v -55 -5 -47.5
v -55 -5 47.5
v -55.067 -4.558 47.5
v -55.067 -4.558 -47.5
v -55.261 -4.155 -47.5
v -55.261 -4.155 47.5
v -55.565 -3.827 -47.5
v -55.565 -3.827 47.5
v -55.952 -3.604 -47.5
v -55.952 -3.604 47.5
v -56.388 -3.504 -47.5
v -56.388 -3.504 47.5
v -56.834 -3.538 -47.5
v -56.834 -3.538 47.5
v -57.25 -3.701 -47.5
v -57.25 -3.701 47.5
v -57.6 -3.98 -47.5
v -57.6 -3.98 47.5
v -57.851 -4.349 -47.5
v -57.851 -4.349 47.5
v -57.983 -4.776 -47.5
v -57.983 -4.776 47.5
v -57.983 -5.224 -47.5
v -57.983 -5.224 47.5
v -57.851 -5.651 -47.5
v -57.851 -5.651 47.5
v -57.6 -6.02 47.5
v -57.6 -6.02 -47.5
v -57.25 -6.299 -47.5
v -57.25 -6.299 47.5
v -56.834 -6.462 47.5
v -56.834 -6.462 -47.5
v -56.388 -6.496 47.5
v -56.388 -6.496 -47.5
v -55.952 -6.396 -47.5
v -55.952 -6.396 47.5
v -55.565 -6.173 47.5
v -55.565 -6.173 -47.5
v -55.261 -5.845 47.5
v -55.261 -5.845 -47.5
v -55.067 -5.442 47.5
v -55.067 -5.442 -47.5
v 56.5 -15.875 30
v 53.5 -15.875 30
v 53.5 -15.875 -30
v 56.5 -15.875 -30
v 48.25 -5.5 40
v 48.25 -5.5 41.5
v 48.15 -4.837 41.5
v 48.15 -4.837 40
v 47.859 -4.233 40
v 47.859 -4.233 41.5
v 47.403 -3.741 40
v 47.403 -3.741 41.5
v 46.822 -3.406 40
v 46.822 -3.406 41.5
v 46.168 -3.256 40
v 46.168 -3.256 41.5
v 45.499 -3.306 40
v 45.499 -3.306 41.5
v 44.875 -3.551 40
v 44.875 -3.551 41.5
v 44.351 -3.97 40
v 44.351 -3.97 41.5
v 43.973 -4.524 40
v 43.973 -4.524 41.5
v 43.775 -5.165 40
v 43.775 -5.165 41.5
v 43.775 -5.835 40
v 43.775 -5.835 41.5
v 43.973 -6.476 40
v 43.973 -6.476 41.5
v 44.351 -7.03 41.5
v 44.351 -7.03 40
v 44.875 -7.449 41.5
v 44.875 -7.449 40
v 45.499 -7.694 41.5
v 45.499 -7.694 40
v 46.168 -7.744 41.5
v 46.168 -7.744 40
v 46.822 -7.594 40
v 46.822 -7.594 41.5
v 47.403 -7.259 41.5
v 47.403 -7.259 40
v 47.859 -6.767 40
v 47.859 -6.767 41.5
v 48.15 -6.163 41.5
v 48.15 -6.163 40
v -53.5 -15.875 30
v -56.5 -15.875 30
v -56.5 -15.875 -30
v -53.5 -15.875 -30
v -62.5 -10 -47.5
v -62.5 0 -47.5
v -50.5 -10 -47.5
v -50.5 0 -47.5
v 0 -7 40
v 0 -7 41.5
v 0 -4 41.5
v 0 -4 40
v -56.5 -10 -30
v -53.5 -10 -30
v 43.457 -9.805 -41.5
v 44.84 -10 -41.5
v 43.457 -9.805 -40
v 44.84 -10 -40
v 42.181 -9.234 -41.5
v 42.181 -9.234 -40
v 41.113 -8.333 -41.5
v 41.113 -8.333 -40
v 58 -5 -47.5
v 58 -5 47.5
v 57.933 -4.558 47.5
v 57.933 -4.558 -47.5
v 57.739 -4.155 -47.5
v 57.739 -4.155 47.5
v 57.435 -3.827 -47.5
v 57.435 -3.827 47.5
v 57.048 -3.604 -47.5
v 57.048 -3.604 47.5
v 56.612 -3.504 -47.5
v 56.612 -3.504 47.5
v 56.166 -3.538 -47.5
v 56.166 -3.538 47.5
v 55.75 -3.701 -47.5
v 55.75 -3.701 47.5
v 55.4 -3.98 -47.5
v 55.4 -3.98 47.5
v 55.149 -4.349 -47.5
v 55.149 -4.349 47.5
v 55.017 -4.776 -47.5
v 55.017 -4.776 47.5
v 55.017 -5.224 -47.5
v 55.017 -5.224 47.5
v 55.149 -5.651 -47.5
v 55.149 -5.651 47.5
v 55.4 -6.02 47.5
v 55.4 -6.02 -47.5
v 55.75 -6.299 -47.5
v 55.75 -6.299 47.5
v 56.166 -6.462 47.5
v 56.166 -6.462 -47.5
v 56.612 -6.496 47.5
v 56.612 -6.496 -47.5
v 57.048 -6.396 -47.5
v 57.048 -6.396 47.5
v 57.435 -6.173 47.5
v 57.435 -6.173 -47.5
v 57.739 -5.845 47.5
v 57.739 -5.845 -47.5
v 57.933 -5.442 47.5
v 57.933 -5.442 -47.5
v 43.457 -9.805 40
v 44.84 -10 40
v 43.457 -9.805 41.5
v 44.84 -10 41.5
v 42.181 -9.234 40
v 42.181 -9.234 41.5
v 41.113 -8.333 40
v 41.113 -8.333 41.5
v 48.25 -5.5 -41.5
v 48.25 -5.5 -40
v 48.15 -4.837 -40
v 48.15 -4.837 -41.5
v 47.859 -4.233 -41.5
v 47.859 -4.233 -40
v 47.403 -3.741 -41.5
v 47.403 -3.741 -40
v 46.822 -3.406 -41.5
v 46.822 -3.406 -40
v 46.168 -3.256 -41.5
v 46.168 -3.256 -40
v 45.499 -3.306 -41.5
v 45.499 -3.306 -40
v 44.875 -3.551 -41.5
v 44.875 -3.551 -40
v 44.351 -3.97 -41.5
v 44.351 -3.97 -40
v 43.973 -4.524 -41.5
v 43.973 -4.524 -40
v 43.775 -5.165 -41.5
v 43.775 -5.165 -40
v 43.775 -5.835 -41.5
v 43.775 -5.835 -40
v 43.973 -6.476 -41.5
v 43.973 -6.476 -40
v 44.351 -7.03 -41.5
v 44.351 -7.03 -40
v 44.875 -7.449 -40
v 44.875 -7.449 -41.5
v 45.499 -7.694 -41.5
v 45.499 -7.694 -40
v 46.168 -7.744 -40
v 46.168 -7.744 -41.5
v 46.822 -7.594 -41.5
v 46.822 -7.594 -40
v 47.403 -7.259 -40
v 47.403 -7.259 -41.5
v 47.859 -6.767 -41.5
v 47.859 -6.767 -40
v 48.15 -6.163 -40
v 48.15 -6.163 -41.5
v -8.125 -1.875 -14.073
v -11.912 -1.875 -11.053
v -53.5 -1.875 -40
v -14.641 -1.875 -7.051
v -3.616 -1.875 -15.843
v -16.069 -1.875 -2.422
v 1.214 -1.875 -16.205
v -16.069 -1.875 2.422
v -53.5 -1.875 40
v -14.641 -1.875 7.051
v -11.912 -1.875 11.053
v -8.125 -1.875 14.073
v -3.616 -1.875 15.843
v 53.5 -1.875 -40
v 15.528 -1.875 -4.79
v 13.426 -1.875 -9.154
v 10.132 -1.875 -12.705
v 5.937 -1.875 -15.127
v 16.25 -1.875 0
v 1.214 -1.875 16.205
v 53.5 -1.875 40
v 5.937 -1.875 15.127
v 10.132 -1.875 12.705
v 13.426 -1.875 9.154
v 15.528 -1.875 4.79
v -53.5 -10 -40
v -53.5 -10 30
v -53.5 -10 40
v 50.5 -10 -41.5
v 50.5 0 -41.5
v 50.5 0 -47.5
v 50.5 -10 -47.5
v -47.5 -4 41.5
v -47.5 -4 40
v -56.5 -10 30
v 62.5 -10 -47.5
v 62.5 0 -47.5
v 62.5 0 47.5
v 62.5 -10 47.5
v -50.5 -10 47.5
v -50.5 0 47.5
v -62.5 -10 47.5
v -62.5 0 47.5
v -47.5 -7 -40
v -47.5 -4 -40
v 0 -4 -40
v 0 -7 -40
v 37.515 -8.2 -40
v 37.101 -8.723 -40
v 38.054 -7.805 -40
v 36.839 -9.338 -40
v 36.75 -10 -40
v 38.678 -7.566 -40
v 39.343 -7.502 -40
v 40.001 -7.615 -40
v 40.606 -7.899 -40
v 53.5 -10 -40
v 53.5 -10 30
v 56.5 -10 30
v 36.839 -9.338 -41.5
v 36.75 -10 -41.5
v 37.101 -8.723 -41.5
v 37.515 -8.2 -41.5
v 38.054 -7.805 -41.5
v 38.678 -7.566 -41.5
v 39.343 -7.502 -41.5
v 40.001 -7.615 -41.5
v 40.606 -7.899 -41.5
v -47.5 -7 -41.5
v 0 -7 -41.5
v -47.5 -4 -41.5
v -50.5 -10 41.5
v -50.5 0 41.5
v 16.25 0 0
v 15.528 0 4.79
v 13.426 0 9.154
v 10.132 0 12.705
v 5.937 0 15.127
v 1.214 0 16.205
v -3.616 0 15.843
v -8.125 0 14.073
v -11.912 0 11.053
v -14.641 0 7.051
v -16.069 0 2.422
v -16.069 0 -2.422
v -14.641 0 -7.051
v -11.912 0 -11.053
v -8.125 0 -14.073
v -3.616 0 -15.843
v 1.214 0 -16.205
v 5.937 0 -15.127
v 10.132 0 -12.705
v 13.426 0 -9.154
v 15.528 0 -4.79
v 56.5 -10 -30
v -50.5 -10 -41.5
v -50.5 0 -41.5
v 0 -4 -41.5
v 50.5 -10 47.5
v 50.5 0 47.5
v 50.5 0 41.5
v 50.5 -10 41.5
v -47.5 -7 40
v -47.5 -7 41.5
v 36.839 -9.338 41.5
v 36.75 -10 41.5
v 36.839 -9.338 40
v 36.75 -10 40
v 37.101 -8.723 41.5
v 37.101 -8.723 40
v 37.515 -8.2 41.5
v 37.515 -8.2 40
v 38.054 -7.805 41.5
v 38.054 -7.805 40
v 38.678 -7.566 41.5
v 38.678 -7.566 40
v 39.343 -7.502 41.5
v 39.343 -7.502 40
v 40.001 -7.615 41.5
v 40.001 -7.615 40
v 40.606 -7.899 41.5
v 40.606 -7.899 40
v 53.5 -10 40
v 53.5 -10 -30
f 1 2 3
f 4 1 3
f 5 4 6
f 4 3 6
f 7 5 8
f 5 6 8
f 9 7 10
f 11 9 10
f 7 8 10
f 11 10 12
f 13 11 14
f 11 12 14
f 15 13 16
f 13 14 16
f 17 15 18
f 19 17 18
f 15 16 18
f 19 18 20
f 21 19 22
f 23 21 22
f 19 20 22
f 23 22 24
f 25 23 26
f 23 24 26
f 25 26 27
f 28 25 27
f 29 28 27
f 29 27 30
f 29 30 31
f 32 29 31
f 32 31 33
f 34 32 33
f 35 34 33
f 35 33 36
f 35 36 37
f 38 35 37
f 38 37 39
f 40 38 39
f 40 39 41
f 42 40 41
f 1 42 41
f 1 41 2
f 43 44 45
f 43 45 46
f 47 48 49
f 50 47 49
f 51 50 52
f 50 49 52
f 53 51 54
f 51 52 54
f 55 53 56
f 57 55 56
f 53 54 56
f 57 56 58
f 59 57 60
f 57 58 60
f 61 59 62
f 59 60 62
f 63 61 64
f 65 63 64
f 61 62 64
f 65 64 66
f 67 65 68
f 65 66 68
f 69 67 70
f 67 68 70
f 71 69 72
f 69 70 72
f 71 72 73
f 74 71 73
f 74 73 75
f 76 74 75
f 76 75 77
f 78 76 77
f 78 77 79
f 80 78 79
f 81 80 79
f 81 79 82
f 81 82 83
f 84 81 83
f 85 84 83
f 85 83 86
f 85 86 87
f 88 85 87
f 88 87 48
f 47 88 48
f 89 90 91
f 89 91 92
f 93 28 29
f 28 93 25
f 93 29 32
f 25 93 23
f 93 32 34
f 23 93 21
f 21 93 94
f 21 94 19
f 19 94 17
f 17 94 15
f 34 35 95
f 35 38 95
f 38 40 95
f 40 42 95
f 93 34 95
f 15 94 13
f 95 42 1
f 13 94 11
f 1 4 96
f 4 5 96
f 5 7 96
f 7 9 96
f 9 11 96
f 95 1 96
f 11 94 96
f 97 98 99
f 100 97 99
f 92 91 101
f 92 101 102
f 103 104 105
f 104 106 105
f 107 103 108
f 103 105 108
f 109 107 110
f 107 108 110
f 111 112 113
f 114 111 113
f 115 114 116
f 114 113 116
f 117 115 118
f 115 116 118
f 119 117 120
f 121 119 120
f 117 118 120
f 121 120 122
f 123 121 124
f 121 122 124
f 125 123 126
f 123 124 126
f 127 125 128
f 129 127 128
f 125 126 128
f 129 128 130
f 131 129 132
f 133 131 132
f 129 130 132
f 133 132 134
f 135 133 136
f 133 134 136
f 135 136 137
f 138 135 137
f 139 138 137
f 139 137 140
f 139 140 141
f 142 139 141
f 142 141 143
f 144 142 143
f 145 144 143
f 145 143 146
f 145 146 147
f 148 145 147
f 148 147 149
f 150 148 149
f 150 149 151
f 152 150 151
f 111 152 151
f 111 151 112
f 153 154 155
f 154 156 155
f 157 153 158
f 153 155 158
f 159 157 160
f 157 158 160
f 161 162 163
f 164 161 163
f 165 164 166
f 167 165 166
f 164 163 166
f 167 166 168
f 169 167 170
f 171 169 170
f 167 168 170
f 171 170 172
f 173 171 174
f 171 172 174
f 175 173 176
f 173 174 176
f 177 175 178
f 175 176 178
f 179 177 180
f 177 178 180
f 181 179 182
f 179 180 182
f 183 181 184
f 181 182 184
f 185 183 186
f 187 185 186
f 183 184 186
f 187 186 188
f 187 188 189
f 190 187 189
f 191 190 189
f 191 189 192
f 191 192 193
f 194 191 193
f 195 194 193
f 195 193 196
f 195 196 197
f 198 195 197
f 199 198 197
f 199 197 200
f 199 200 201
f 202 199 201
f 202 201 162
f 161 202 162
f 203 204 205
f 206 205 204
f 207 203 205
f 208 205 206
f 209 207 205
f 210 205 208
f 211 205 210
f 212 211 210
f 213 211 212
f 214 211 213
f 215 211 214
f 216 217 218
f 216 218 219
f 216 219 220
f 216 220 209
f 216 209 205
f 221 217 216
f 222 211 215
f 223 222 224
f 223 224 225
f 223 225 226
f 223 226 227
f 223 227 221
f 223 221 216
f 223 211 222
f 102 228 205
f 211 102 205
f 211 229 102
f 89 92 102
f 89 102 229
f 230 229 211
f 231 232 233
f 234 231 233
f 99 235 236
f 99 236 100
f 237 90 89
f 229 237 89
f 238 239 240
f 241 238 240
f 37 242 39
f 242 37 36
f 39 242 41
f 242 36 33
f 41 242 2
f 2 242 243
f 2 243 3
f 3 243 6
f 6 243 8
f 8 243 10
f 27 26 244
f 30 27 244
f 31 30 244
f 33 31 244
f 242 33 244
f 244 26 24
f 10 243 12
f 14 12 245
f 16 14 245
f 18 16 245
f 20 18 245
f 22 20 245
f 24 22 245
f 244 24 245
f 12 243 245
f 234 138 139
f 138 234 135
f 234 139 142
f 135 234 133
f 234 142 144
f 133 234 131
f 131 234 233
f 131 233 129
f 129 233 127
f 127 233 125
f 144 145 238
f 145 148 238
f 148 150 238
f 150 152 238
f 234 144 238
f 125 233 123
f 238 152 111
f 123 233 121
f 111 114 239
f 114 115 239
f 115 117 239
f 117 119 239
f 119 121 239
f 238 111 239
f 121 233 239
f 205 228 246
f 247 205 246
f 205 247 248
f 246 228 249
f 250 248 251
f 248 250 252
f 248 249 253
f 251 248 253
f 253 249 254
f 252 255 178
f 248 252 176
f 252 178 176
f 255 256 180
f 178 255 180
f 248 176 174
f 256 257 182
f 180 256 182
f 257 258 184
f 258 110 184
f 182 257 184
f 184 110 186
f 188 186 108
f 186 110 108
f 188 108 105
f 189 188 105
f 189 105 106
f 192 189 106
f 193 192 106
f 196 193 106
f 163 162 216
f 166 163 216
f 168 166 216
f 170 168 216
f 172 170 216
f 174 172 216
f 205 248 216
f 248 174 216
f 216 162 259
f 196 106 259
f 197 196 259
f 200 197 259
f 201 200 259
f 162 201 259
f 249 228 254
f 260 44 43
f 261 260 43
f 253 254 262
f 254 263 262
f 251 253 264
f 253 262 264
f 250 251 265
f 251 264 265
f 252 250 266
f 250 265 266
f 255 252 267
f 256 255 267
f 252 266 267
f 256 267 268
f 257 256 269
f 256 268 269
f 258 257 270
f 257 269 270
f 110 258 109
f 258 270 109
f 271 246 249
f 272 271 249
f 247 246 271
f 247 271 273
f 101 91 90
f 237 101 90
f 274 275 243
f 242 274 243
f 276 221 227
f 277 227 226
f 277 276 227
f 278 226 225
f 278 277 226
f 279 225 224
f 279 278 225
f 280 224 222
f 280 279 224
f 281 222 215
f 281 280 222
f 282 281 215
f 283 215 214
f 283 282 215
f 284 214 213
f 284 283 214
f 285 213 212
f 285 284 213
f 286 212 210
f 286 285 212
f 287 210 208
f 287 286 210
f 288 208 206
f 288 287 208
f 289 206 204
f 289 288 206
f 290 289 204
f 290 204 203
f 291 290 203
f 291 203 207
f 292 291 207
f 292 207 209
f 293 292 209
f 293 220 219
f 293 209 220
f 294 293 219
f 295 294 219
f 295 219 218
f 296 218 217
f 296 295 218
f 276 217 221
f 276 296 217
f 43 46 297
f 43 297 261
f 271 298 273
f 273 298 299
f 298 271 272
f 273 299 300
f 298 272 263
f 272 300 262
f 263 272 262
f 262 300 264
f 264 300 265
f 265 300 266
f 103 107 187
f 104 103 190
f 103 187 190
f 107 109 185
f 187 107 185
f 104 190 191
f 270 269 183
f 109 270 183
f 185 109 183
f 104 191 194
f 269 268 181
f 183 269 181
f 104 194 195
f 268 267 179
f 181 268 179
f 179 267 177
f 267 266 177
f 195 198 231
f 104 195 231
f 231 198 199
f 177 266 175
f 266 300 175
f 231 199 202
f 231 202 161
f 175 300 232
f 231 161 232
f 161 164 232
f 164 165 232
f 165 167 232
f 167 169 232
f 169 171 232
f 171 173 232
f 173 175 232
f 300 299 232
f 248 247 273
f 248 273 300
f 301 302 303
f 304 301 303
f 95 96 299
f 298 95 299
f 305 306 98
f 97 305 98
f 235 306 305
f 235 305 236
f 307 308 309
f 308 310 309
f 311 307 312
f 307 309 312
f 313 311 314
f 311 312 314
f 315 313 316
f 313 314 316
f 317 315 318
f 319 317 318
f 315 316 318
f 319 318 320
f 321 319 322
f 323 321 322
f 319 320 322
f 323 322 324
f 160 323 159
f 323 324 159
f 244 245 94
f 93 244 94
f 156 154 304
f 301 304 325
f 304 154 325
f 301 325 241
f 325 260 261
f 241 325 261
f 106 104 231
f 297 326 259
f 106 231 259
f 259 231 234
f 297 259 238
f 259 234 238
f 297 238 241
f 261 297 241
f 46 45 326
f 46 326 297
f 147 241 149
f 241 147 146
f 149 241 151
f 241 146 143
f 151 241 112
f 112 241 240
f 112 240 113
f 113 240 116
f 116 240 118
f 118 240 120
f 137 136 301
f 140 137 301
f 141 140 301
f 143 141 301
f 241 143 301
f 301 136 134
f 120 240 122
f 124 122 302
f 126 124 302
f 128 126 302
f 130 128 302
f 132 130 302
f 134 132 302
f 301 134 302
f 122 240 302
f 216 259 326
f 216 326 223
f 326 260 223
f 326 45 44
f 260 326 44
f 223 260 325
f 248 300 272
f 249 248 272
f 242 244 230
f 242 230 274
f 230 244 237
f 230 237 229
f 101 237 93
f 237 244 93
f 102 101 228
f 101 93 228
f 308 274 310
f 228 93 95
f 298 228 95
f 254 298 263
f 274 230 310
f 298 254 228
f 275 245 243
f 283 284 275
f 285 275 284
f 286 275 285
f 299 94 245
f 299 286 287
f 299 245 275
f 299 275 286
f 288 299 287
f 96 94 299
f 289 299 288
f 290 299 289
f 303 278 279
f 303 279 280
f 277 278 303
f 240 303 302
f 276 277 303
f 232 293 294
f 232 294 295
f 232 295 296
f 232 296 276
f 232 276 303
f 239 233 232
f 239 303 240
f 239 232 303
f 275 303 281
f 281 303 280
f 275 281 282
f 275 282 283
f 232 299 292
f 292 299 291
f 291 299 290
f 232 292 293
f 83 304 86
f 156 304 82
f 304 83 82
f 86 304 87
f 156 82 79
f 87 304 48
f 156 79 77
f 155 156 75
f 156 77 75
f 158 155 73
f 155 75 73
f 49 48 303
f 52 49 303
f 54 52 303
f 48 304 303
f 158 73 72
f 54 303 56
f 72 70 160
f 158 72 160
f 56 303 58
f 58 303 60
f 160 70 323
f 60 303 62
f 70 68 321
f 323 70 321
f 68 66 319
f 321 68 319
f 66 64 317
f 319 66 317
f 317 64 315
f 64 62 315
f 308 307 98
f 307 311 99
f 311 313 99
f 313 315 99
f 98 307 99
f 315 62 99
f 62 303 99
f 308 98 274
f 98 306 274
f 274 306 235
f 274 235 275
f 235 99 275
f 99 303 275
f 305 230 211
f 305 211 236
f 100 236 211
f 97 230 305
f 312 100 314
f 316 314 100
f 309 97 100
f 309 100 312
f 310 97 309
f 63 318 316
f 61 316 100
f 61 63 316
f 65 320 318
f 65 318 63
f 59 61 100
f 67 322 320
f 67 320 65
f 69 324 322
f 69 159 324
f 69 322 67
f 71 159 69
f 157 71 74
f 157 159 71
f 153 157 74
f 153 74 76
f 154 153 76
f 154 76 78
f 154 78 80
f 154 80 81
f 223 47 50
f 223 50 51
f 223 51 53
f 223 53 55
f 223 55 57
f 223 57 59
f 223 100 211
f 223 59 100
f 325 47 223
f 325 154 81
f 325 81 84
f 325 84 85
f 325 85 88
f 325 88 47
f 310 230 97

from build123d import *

# Parameters (mm, degrees)
F0_R      = 16.25
F1_DEPTH  = 15.875
F2_W      = 139.2096877098
F2_H      = 115.5483946204
F2_W_2    = 113
F2_H_2    = 80
F3_DEPTH  = 5.875
F4_W      = 107
F4_H      = 80
F5_DEPTH  = 14
F6_W      = 120.5911301091
F6_H      = 13.1527084535
F6_W_2    = 121.3300417974
F6_H_2    = 15.8128053223
F7_DEPTH  = 5.875
F8_R      = 1.5
F8_W      = 89
F8_H      = 3
F9_DEPTH  = 100
F10_W     = 42.4407012761
F10_H     = 10
F11_DEPTH = 1.5
F12_W     = 42.5221920013
F12_H     = 10
F13_DEPTH = 1.5
F14_R     = 2.5
F15_DEPTH = 95.5
F16_R     = 2.25
F17_DEPTH = 200
F18_R     = 5
F19_R     = 1.5
F20_DEPTH = 106.2
F21_R     = 1.5
F22_DEPTH = 121.8


with BuildPart() as f1:
    # F0 (on Front) → F1 (new body)
    with BuildSketch(Plane.XZ):
        Polygon((-50.5, 47.5), (-62.5, 47.5), (-62.5, -47.5), (-50.5, -47.5), (-50.5, -41.5), (50.5, -41.5), (50.5, -47.5), (62.5, -47.5), (62.5, 47.5), (50.5, 47.5), (50.5, 41.5), (-50.5, 41.5), align=None)
        Circle(F0_R, mode=Mode.SUBTRACT)
    extrude(amount=F1_DEPTH)

    # F2 (on face) → F3 (cut)
    with BuildSketch(Plane.XZ.offset(15.875)):
        Rectangle(F2_W, F2_H)
        Rectangle(F2_W_2, F2_H_2, mode=Mode.SUBTRACT)
    extrude(amount=-F3_DEPTH, mode=Mode.SUBTRACT)

    # F4 (on face) → F5 (cut)
    with BuildSketch(Plane.XZ.offset(15.875)):
        Rectangle(F4_W, F4_H)
    extrude(amount=-F5_DEPTH, mode=Mode.SUBTRACT)

    # F6 (on face) → F7 (cut)
    with BuildSketch(Plane.XZ.offset(15.875)):
        with Locations((0.0607829645, 36.5763542267)):
            Rectangle(F6_W, F6_H)
        with Locations((1.0213727103, -37.9064026611)):
            Rectangle(F6_W_2, F6_H_2)
    extrude(amount=-F7_DEPTH, mode=Mode.SUBTRACT)

    # F8 (on face) → F9 (cut)
    with BuildSketch(Plane.XY.offset(41.5)):
        with Locations((46, -5.5)):
            Circle(F8_R)
        with Locations((-3, -5.5)):
            Rectangle(F8_W, F8_H)
    extrude(amount=-F9_DEPTH, mode=Mode.SUBTRACT)

    # F10 (on face) → F11 (join)
    with BuildSketch(Plane.XY.offset(41.5)):
        with Locations((21.220350638, -5)):
            Rectangle(F10_W, F10_H)
    extrude(amount=-F11_DEPTH)

    # F12 (on face) → F13 (join)
    with BuildSketch(Plane(origin=(0, 0, -41.5), x_dir=(1, 0, 0), z_dir=(0, 0, -1))):
        with Locations((21.2610960007, 5)):
            Rectangle(F12_W, F12_H)
    extrude(amount=-F13_DEPTH)

    # F14 (on face) → F15 (cut)
    with BuildSketch(Plane(origin=(0, 0, -41.5), x_dir=(1, 0, 0), z_dir=(0, 0, -1))):
        with Locations((39.25, 10)):
            Circle(F14_R)
    extrude(amount=-F15_DEPTH, mode=Mode.SUBTRACT)

    # F16 (on face) → F17 (cut)
    with BuildSketch(Plane.XY.offset(41.5)):
        with Locations((46, -5.5)):
            Circle(F16_R)
    extrude(amount=-F17_DEPTH, mode=Mode.SUBTRACT)

    # F18
    f18_edges = [f1.edges().sort_by_distance(p)[0] for p in [
        (41.75, -10, -40.75),
        (41.75, -10, 40.75),
    ]]
    fillet(f18_edges, radius=F18_R)

    # F19 (on face) → F20 (cut)
    with BuildSketch(Plane.XY.offset(47.5)):
        with Locations((-56.5, -5)):
            Circle(F19_R)
    extrude(amount=-F20_DEPTH, mode=Mode.SUBTRACT)

    # F21 (on face) → F22 (cut)
    with BuildSketch(Plane.XY.offset(47.5)):
        with Locations((56.5, -5)):
            Circle(F21_R)
    extrude(amount=-F22_DEPTH, mode=Mode.SUBTRACT)


solid = f1.part
